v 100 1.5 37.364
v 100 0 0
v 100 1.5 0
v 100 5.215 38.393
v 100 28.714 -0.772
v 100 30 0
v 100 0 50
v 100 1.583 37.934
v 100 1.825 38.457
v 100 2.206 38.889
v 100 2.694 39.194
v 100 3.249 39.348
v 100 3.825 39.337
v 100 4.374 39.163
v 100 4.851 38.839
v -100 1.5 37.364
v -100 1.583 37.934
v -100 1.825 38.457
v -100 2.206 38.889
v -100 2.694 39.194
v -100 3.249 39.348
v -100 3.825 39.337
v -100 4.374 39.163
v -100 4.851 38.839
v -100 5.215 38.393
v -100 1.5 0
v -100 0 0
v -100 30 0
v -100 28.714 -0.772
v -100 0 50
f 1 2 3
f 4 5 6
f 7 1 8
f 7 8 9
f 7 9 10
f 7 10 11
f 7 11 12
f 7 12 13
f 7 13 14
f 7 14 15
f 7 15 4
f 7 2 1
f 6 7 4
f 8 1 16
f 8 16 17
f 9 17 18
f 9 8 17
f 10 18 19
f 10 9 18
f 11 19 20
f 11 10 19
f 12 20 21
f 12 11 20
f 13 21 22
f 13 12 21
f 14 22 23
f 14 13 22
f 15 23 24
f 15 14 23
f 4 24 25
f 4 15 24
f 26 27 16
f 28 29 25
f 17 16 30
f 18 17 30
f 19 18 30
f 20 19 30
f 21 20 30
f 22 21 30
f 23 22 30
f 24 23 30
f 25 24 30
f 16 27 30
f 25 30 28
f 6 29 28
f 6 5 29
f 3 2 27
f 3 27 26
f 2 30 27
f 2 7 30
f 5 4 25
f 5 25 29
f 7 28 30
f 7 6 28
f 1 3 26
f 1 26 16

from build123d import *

# Parameters (mm, degrees)
F1_DEPTH = 100


with BuildPart() as f1:
    # F0 (on Right) → F1 (new body, symmetric)
    with BuildSketch(Plane.YZ):
        with BuildLine():
            Line((0, 50), (0, 0))
            Line((0, 0), (1.5, 0))
            Line((1.5, 0), (1.5, 37.363889))
            ThreePointArc((1.5, 37.363889), (2.966133, 39.291319), (5.214986, 38.392881))
            Line((5.214986, 38.392881), (28.713761, -0.771744))
            Line((28.713761, -0.771744), (30, 0))
            Line((30, 0), (0, 50))
        make_face()
    extrude(amount=F1_DEPTH, both=True)


solid = f1.part
